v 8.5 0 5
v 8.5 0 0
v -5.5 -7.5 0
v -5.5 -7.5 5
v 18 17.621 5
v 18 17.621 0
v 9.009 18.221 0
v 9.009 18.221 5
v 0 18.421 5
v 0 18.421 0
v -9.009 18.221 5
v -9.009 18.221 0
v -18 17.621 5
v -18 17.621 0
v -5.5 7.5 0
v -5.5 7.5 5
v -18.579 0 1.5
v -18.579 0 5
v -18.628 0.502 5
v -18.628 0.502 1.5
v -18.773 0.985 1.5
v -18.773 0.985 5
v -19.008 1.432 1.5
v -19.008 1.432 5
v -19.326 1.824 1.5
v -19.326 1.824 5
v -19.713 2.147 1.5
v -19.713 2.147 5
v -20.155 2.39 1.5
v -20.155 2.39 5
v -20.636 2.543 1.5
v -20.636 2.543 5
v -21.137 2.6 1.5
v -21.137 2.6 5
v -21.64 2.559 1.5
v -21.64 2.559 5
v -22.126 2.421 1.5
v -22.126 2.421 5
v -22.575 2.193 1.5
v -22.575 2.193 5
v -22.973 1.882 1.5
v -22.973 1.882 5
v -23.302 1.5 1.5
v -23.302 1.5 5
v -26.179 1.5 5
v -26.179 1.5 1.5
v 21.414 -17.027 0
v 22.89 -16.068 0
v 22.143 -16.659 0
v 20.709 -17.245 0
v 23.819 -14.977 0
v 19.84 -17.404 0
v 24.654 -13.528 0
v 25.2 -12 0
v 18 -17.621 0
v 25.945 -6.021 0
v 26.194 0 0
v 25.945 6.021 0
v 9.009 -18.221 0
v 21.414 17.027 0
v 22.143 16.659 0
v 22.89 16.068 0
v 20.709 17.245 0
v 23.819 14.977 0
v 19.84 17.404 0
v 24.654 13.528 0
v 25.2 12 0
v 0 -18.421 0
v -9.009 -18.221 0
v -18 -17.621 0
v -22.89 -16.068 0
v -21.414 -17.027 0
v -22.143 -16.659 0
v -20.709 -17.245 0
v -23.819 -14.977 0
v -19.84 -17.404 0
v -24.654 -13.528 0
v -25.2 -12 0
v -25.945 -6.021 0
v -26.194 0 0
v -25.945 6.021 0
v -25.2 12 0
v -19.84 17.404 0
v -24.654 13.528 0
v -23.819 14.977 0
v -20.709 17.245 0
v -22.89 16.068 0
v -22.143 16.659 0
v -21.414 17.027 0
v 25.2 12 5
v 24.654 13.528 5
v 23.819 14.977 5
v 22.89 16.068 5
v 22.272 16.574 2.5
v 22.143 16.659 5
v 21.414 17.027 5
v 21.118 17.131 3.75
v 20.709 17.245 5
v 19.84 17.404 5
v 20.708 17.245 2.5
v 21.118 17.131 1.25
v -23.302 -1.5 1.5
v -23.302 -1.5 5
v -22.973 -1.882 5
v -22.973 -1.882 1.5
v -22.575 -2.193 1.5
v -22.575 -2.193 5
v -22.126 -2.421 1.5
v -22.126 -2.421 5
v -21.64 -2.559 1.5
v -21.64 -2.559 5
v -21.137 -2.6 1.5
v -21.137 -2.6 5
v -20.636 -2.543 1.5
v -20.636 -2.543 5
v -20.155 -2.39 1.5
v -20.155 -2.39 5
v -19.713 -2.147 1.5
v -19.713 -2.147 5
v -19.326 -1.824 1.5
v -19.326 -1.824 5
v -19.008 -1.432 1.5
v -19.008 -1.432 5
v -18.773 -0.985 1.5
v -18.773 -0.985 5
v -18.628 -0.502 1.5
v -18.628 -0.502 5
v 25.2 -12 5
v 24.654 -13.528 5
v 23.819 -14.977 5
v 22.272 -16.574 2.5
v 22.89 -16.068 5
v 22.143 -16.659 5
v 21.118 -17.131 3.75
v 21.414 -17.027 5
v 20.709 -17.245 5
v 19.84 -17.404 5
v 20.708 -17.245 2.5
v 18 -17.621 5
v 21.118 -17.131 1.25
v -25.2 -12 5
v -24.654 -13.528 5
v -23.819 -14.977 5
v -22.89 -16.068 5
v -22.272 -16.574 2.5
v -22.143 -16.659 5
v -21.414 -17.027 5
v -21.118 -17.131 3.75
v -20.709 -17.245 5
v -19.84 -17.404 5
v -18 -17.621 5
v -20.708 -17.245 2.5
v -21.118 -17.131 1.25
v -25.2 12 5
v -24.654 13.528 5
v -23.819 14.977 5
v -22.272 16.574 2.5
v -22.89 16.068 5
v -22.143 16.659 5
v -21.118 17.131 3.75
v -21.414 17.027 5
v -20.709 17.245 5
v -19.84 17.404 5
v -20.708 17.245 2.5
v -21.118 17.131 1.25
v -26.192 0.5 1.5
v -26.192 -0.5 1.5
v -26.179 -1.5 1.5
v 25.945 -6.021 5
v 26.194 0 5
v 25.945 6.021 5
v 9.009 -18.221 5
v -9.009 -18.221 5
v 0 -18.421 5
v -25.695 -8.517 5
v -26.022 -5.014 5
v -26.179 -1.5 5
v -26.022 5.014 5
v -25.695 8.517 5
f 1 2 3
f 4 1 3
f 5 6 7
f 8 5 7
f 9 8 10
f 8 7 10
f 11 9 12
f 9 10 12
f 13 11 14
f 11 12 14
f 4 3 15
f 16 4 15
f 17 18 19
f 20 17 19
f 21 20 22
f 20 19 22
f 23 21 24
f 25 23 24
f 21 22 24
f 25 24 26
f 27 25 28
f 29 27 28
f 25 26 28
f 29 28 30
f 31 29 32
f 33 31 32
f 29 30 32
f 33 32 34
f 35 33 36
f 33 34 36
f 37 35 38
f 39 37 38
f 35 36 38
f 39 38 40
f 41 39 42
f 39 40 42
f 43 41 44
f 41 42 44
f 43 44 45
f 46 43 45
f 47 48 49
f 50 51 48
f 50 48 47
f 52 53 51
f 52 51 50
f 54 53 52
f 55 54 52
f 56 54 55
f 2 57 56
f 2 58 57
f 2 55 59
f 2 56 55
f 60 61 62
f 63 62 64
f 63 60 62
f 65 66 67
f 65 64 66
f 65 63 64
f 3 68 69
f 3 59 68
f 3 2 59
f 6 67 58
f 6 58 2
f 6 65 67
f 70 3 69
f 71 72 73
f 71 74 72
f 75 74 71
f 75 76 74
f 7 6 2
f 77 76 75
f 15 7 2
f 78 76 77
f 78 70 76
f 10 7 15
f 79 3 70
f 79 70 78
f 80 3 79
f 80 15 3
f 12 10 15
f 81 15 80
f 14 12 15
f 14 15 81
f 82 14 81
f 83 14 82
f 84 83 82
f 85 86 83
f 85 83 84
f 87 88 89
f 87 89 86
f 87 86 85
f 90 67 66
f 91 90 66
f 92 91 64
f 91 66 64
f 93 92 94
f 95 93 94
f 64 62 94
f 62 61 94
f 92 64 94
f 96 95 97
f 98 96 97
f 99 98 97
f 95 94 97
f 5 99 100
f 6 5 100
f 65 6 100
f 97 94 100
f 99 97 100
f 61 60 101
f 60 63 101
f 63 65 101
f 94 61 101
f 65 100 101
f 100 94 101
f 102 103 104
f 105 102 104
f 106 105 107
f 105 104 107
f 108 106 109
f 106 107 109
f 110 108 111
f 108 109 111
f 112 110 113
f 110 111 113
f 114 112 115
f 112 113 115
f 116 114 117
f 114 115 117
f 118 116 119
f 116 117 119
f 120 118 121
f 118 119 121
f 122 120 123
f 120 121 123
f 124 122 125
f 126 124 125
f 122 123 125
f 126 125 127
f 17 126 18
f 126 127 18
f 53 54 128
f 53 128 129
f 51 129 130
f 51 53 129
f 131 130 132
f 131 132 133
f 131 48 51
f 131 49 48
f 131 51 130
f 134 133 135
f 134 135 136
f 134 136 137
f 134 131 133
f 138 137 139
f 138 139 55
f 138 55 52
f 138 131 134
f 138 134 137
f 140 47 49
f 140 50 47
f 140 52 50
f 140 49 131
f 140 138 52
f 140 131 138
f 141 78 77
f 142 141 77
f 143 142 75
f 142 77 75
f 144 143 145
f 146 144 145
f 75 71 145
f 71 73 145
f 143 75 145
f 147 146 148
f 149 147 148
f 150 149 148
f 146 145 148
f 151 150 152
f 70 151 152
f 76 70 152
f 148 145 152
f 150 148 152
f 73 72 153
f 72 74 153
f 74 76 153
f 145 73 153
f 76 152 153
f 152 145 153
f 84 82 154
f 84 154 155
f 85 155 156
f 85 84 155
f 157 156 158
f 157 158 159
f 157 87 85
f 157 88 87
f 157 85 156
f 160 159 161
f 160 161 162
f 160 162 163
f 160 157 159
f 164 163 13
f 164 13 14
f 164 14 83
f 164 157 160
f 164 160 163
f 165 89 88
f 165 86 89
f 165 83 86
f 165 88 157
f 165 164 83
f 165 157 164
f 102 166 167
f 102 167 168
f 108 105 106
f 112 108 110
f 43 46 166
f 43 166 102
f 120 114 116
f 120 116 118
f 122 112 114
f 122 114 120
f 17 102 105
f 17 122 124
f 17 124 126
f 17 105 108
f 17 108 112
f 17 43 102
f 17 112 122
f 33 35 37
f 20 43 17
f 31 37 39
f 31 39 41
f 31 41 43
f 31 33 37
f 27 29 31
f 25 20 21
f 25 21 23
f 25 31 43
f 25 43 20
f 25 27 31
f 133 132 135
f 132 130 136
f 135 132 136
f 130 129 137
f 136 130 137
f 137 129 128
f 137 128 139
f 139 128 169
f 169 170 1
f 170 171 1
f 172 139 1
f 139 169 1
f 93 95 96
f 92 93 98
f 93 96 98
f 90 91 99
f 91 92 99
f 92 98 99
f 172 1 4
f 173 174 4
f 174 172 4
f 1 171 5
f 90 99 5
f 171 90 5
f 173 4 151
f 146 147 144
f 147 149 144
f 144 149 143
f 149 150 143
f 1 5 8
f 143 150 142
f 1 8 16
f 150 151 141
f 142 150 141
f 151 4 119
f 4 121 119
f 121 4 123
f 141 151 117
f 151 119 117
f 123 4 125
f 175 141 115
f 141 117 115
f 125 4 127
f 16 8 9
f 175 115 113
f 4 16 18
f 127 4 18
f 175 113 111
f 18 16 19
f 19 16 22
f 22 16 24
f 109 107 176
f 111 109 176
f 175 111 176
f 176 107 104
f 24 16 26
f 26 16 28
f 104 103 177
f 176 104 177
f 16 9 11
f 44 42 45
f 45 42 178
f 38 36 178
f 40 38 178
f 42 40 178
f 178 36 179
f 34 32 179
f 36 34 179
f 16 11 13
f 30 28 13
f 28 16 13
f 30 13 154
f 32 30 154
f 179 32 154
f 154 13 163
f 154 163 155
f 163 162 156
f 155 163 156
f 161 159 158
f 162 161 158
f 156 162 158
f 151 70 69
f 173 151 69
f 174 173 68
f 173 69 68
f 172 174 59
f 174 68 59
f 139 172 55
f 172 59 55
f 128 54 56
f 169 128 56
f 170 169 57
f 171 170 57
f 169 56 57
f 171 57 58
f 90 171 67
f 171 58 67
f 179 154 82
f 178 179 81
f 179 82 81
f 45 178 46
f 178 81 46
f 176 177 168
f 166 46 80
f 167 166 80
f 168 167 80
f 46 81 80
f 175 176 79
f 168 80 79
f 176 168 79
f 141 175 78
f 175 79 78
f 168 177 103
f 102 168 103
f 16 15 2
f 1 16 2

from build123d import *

# Parameters (mm, degrees)
F1_DEPTH = 5
F4_DEPTH = 3.5


with BuildPart() as f1:
    # F0 (on Top) → F1 (new body)
    with BuildSketch(Plane.XY):
        with BuildLine():
            add(Edge.make_bspline(
                [(-25.2, 12), (-24.770263451, 13.7320665567), (-22.5559362307, 17.3933294028), (-19.7388011355, 17.4001357259), (-18, 17.6210526316)],
                knots=[0, 0, 0, 0, 0.5263054949, 1, 1, 1, 1], degree=3))
            ThreePointArc((-25.2, 12), (-26.1941368445, 0), (-25.2, -12))
            add(Edge.make_bspline(
                [(-25.2, -12), (-24.770263451, -13.7320665567), (-22.5559362307, -17.3933294028), (-19.7388011355, -17.4001357259), (-18, -17.6210526316)],
                knots=[0, 0, 0, 0, 0.5263054949, 1, 1, 1, 1], degree=3))
            ThreePointArc((-18, -17.6210526316), (0, -18.4210526316), (18, -17.6210526316))
            add(Edge.make_bspline(
                [(25.2, -12), (24.770263451, -13.7320665567), (22.5559362307, -17.3933294028), (19.7388011355, -17.4001357259), (18, -17.6210526316)],
                knots=[0, 0, 0, 0, 0.5263054949, 1, 1, 1, 1], degree=3))
            ThreePointArc((25.2, -12), (26.1941368445, 0), (25.2, 12))
            add(Edge.make_bspline(
                [(25.2, 12), (24.770263451, 13.7320665567), (22.5559362307, 17.3933294028), (19.7388011355, 17.4001357259), (18, 17.6210526316)],
                knots=[0, 0, 0, 0, 0.5263054949, 1, 1, 1, 1], degree=3))
            ThreePointArc((18, 17.6210526316), (0, 18.4210526316), (-18, 17.6210526316))
        make_face()
        Polygon((-5.5, -7.5), (-5.5, 7.5), (8.5, 0), align=None, mode=Mode.SUBTRACT)
    extrude(amount=F1_DEPTH)


with BuildPart() as f1_1:
    # F2: moved
    add(f1.part)

    # F3 (on face) → F4 (cut)
    with BuildSketch(Plane.XY.offset(5)):
        with BuildLine():
            ThreePointArc((-23.302383765, -1.5), (-23.7787077069, 0), (-23.302383765, 1.5))
            Line((-23.302383765, 1.5), (-26.1787077069, 1.5))
            ThreePointArc((-26.1787077069, 1.5), (-26.1941368445, 0), (-26.1787077069, -1.5))
            Line((-26.1787077069, -1.5), (-23.302383765, -1.5))
        make_face()
        with BuildLine():
            ThreePointArc((-23.302383765, -1.5), (-20.3918016614, -2.478059498), (-18.5787077069, 0))
            ThreePointArc((-18.5787077069, 0), (-20.3918016614, 2.478059498), (-23.302383765, 1.5))
            ThreePointArc((-23.302383765, 1.5), (-23.7787077069, 0), (-23.302383765, -1.5))
        make_face()
    extrude(amount=-F4_DEPTH, mode=Mode.SUBTRACT)


solid = f1_1.part
